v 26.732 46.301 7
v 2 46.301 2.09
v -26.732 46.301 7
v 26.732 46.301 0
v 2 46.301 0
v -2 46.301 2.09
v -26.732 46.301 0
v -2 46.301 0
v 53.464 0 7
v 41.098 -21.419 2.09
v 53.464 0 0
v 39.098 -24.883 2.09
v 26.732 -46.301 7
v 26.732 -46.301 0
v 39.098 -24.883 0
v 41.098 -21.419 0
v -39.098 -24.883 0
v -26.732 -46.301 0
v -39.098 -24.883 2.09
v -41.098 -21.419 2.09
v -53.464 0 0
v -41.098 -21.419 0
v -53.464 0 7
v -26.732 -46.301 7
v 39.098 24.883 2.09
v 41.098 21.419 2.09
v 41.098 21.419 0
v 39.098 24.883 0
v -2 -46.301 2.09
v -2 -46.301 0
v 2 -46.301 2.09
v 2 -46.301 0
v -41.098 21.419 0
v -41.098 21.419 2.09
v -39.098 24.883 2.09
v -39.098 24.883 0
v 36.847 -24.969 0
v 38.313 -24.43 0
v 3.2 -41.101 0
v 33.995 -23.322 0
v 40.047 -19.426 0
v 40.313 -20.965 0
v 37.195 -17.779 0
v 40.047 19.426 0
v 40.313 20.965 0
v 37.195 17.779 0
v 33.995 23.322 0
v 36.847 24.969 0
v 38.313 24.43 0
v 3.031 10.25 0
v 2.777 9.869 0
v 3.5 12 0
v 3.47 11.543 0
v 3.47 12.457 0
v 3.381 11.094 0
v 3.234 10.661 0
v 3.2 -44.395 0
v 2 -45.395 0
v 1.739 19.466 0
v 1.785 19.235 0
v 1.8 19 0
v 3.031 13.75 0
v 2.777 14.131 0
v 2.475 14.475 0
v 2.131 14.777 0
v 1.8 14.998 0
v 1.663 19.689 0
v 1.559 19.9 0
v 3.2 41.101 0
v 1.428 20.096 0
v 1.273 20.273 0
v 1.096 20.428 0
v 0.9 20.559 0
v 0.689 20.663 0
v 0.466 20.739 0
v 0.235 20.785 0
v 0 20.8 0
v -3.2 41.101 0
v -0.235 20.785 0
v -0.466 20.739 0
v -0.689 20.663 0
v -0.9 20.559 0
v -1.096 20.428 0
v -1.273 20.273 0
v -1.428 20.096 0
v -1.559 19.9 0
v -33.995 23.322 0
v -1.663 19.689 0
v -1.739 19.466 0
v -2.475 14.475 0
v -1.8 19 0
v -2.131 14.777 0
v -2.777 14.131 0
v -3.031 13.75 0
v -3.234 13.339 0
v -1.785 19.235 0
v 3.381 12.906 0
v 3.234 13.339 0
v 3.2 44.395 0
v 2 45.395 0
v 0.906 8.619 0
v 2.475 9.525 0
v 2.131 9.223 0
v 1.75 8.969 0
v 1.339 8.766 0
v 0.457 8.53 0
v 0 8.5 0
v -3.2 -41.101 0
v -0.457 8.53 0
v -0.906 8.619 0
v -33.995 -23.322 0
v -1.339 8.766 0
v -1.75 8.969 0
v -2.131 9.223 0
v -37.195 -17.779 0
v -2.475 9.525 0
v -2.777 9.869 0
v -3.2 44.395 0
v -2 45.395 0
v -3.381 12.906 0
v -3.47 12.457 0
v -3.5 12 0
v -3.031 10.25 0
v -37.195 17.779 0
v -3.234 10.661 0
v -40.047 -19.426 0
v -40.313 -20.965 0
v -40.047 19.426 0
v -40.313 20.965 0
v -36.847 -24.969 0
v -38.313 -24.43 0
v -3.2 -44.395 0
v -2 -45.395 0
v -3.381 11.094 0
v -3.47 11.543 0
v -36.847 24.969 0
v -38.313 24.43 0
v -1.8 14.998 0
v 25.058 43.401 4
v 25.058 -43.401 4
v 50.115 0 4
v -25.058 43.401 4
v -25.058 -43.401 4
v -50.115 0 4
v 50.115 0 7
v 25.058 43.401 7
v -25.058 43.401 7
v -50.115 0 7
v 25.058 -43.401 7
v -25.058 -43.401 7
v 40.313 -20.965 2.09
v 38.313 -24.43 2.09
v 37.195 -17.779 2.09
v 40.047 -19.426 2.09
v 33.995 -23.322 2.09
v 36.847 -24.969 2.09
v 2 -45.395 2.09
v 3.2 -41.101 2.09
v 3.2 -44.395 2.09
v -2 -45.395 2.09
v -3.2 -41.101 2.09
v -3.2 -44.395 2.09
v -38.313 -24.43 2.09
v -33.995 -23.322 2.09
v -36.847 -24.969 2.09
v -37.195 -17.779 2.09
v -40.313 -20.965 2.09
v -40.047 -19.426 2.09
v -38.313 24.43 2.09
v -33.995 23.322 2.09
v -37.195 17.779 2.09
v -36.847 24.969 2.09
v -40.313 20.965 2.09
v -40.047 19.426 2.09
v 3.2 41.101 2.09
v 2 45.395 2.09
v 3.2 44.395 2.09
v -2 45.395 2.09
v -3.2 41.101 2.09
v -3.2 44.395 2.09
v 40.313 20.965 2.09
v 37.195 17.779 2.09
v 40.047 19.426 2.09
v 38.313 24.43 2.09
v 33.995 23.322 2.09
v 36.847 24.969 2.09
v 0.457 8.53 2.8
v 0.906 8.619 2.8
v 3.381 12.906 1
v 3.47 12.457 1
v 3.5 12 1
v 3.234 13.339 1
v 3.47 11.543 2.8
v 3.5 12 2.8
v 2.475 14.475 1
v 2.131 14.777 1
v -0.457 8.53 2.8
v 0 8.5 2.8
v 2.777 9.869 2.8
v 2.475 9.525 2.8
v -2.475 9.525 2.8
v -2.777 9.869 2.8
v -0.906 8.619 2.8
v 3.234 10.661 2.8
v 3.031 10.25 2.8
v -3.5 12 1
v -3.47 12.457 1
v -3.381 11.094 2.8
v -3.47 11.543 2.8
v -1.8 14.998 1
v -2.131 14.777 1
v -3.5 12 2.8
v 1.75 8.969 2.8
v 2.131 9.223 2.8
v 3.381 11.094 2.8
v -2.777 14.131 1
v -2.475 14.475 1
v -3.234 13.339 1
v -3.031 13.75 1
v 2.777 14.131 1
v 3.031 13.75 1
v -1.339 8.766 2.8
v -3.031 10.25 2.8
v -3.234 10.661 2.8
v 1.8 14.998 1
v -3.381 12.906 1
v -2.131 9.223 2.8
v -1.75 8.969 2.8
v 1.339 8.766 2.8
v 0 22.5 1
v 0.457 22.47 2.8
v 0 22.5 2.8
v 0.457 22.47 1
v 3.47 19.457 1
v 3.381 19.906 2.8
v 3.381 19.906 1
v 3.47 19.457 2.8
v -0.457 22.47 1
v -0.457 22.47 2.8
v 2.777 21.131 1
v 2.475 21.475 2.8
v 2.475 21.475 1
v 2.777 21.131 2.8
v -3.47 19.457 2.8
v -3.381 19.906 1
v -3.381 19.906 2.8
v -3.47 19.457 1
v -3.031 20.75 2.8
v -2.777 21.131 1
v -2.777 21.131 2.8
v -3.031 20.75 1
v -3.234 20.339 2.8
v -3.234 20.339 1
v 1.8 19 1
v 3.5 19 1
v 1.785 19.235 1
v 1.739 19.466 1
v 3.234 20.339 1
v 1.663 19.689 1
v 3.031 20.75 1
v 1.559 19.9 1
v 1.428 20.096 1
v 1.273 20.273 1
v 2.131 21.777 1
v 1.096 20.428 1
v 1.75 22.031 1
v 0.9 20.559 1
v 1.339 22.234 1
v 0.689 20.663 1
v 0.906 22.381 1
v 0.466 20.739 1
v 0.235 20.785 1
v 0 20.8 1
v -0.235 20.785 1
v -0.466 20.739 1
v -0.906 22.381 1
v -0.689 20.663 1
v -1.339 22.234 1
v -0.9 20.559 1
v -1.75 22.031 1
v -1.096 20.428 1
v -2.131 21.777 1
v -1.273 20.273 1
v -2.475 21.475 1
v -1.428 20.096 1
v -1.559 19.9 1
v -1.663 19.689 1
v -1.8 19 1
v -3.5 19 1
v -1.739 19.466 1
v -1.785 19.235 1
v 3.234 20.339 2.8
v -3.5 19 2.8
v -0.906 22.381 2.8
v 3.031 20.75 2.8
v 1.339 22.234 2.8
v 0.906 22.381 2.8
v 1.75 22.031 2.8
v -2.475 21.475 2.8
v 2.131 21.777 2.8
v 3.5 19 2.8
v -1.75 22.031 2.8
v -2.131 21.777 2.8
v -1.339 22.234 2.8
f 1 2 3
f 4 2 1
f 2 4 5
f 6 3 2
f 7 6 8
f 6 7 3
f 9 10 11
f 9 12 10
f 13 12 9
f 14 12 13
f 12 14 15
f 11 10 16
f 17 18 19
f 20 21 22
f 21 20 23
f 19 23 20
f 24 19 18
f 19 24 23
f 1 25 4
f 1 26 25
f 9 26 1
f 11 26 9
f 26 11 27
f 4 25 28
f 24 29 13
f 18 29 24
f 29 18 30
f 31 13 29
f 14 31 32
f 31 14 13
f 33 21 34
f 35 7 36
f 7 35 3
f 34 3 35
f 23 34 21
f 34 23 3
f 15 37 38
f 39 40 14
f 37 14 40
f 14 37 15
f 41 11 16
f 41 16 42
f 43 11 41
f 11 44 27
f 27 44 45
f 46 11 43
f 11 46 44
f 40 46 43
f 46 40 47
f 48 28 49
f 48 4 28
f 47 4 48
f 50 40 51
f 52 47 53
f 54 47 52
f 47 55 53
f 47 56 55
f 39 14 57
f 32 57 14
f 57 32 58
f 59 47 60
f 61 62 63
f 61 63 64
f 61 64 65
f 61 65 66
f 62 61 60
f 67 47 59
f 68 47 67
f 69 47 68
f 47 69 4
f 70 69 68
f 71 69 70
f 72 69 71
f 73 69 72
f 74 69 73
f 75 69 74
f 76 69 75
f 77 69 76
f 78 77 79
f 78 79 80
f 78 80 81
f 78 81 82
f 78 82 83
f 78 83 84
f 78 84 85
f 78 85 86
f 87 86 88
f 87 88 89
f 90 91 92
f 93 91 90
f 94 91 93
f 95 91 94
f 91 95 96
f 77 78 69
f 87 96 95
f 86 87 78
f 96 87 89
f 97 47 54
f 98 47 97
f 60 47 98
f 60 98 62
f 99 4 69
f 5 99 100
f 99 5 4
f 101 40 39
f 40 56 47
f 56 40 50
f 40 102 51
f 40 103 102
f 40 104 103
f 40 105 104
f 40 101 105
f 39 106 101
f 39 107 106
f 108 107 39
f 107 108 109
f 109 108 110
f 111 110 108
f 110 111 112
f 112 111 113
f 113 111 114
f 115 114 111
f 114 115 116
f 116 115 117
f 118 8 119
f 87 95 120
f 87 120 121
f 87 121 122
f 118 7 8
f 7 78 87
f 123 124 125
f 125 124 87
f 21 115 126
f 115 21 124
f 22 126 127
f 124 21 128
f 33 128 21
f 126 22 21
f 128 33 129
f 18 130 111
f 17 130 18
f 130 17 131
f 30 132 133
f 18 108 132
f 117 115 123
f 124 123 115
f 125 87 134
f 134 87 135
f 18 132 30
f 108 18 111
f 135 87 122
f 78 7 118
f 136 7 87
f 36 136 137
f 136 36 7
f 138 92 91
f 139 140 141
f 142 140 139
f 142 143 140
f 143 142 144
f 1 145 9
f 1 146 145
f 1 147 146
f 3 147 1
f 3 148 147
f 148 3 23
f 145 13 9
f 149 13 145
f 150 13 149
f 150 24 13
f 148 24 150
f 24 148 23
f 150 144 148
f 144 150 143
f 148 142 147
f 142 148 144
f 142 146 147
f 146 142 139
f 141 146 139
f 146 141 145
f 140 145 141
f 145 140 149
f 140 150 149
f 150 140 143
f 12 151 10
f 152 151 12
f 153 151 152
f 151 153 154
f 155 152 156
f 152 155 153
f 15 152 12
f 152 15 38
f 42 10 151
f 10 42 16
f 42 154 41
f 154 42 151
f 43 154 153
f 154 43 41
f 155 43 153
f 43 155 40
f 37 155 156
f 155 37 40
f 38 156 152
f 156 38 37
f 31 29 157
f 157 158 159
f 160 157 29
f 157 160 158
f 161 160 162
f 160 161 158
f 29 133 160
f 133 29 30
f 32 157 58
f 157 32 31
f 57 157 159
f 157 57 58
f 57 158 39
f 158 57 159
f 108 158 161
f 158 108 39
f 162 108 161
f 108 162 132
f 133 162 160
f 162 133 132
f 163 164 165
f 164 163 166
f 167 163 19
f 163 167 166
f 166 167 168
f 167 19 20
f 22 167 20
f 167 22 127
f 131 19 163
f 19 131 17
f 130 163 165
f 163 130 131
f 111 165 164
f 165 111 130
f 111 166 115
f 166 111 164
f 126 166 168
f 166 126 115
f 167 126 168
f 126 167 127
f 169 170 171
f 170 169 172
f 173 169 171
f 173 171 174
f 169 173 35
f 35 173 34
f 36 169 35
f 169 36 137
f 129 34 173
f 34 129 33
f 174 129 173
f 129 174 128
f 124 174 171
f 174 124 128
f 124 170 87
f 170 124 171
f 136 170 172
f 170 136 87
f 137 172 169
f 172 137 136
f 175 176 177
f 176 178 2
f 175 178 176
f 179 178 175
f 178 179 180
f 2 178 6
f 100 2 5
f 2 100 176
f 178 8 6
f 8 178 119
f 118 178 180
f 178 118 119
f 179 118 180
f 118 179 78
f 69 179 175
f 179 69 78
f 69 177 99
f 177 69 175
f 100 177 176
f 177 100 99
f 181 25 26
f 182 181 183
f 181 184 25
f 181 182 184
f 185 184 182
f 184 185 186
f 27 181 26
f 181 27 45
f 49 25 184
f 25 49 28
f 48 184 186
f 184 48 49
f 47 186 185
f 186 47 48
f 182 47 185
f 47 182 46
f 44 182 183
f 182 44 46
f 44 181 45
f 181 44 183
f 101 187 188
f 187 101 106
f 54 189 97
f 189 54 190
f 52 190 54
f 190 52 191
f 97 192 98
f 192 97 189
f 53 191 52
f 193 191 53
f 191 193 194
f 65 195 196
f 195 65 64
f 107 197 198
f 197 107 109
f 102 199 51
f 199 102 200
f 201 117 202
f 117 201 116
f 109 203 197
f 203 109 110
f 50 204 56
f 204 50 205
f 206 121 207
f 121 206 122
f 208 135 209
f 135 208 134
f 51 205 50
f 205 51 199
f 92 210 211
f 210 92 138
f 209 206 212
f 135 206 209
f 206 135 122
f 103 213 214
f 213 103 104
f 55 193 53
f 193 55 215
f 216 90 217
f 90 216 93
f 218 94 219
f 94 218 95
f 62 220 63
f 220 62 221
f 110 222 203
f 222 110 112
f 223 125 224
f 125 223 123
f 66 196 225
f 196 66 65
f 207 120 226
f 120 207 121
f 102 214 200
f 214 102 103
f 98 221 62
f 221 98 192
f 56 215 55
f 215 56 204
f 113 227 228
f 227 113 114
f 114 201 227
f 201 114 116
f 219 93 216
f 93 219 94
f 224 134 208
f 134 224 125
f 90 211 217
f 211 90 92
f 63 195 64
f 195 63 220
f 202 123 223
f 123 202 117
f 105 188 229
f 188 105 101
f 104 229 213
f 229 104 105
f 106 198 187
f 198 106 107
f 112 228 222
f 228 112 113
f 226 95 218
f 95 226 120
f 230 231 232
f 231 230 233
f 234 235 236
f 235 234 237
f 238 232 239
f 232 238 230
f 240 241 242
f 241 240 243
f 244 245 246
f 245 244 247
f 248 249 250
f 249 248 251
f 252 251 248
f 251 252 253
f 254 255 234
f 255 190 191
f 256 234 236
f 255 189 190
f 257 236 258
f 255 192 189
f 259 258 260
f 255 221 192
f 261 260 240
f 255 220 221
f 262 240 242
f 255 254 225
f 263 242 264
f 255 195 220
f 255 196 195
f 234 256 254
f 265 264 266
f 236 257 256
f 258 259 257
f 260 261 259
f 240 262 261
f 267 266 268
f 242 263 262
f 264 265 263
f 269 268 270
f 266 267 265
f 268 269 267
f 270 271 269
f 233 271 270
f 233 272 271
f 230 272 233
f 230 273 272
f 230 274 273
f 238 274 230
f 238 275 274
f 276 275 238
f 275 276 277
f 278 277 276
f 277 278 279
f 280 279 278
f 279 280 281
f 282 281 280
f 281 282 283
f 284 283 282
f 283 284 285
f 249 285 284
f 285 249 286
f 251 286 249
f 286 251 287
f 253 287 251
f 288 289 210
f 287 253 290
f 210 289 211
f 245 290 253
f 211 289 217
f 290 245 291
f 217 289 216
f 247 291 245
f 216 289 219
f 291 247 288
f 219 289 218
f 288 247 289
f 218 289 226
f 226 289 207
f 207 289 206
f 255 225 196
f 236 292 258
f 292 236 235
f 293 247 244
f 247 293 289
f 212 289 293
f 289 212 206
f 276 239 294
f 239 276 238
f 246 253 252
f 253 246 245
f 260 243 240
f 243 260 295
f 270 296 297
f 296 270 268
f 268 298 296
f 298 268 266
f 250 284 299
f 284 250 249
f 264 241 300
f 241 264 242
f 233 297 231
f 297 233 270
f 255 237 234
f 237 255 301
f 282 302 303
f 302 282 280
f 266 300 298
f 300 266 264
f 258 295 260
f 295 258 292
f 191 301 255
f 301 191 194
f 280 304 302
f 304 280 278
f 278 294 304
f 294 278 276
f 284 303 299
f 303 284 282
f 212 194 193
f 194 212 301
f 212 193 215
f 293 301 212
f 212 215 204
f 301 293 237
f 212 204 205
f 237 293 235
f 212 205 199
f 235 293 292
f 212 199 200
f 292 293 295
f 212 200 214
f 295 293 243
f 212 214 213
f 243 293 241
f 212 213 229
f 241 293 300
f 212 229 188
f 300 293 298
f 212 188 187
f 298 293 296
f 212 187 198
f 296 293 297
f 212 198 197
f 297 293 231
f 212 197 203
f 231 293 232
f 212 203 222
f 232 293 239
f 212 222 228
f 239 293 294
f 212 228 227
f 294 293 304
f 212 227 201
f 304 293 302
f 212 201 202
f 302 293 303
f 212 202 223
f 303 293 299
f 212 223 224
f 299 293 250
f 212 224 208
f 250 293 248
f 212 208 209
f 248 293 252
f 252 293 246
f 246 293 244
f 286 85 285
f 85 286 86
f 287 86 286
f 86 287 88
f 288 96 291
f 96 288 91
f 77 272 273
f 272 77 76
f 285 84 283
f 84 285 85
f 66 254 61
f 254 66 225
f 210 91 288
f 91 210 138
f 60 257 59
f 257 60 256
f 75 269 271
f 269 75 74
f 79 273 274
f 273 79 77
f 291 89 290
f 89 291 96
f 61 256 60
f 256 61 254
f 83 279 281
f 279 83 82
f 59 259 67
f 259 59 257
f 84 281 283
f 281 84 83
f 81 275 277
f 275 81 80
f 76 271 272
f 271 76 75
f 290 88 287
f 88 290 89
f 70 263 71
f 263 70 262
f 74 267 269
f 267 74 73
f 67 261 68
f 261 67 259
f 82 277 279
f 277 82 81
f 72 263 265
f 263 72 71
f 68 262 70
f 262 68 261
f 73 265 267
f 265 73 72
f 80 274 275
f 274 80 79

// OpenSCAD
// Contour Studio hex holder. mm. Same sockets and keyhole as modular map holders.
$fn=48; tile=100; gap=6; tolerance=.2; seat=4; rim=3;
module tile_shape(){polygon([[50.0, -7.105427357601002e-15], [25.0, 43.301270189221924], [-24.999999999999993, 43.30127018922194], [-50.0, 0.0], [-25.00000000000002, -43.301270189221924], [25.0, -43.30127018922194]]);}
module key_shape(){polygon([[-5,-3],[-2,-3],[-1,-1.8],[1,-1.8],[2,-3],[5,-3],[5,3],[2,3],[1,1.8],[-1,1.8],[-2,3],[-5,3]]);}
difference(){
 union(){linear_extrude(seat) offset(delta=gap/2) tile_shape();translate([0,0,seat]) linear_extrude(rim) difference(){offset(delta=gap/2) tile_shape();offset(delta=tolerance/2) tile_shape();}}
translate([40.098076211353316,-23.150635094610973,-.01]) rotate([0,0,-30.00000000000001]) linear_extrude(2.1) offset(delta=tolerance) key_shape();
translate([-7.105427357601002e-15,-46.30127018922193,-.01]) rotate([0,0,-90.00000000000001]) linear_extrude(2.1) offset(delta=tolerance) key_shape();
translate([-40.09807621135333,-23.150635094610962,-.01]) rotate([0,0,-150.0]) linear_extrude(2.1) offset(delta=tolerance) key_shape();
translate([-40.098076211353316,23.15063509461097,-.01]) rotate([0,0,150.0]) linear_extrude(2.1) offset(delta=tolerance) key_shape();
translate([7.105427357601002e-15,46.30127018922193,-.01]) rotate([0,0,90.0]) linear_extrude(2.1) offset(delta=tolerance) key_shape();
translate([40.098076211353316,23.15063509461096,-.01]) rotate([0,0,29.999999999999993]) linear_extrude(2.1) offset(delta=tolerance) key_shape();
translate([0,12.0,-.01]) cylinder(h=2.8,r=3.5);
translate([0,12.0,1]) linear_extrude(1.8) hull(){circle(r=3.5);translate([0,7]) circle(r=3.5);}
translate([0,12.0,-.01]) linear_extrude(1.1) hull(){circle(r=1.8);translate([0,7]) circle(r=1.8);}
}
